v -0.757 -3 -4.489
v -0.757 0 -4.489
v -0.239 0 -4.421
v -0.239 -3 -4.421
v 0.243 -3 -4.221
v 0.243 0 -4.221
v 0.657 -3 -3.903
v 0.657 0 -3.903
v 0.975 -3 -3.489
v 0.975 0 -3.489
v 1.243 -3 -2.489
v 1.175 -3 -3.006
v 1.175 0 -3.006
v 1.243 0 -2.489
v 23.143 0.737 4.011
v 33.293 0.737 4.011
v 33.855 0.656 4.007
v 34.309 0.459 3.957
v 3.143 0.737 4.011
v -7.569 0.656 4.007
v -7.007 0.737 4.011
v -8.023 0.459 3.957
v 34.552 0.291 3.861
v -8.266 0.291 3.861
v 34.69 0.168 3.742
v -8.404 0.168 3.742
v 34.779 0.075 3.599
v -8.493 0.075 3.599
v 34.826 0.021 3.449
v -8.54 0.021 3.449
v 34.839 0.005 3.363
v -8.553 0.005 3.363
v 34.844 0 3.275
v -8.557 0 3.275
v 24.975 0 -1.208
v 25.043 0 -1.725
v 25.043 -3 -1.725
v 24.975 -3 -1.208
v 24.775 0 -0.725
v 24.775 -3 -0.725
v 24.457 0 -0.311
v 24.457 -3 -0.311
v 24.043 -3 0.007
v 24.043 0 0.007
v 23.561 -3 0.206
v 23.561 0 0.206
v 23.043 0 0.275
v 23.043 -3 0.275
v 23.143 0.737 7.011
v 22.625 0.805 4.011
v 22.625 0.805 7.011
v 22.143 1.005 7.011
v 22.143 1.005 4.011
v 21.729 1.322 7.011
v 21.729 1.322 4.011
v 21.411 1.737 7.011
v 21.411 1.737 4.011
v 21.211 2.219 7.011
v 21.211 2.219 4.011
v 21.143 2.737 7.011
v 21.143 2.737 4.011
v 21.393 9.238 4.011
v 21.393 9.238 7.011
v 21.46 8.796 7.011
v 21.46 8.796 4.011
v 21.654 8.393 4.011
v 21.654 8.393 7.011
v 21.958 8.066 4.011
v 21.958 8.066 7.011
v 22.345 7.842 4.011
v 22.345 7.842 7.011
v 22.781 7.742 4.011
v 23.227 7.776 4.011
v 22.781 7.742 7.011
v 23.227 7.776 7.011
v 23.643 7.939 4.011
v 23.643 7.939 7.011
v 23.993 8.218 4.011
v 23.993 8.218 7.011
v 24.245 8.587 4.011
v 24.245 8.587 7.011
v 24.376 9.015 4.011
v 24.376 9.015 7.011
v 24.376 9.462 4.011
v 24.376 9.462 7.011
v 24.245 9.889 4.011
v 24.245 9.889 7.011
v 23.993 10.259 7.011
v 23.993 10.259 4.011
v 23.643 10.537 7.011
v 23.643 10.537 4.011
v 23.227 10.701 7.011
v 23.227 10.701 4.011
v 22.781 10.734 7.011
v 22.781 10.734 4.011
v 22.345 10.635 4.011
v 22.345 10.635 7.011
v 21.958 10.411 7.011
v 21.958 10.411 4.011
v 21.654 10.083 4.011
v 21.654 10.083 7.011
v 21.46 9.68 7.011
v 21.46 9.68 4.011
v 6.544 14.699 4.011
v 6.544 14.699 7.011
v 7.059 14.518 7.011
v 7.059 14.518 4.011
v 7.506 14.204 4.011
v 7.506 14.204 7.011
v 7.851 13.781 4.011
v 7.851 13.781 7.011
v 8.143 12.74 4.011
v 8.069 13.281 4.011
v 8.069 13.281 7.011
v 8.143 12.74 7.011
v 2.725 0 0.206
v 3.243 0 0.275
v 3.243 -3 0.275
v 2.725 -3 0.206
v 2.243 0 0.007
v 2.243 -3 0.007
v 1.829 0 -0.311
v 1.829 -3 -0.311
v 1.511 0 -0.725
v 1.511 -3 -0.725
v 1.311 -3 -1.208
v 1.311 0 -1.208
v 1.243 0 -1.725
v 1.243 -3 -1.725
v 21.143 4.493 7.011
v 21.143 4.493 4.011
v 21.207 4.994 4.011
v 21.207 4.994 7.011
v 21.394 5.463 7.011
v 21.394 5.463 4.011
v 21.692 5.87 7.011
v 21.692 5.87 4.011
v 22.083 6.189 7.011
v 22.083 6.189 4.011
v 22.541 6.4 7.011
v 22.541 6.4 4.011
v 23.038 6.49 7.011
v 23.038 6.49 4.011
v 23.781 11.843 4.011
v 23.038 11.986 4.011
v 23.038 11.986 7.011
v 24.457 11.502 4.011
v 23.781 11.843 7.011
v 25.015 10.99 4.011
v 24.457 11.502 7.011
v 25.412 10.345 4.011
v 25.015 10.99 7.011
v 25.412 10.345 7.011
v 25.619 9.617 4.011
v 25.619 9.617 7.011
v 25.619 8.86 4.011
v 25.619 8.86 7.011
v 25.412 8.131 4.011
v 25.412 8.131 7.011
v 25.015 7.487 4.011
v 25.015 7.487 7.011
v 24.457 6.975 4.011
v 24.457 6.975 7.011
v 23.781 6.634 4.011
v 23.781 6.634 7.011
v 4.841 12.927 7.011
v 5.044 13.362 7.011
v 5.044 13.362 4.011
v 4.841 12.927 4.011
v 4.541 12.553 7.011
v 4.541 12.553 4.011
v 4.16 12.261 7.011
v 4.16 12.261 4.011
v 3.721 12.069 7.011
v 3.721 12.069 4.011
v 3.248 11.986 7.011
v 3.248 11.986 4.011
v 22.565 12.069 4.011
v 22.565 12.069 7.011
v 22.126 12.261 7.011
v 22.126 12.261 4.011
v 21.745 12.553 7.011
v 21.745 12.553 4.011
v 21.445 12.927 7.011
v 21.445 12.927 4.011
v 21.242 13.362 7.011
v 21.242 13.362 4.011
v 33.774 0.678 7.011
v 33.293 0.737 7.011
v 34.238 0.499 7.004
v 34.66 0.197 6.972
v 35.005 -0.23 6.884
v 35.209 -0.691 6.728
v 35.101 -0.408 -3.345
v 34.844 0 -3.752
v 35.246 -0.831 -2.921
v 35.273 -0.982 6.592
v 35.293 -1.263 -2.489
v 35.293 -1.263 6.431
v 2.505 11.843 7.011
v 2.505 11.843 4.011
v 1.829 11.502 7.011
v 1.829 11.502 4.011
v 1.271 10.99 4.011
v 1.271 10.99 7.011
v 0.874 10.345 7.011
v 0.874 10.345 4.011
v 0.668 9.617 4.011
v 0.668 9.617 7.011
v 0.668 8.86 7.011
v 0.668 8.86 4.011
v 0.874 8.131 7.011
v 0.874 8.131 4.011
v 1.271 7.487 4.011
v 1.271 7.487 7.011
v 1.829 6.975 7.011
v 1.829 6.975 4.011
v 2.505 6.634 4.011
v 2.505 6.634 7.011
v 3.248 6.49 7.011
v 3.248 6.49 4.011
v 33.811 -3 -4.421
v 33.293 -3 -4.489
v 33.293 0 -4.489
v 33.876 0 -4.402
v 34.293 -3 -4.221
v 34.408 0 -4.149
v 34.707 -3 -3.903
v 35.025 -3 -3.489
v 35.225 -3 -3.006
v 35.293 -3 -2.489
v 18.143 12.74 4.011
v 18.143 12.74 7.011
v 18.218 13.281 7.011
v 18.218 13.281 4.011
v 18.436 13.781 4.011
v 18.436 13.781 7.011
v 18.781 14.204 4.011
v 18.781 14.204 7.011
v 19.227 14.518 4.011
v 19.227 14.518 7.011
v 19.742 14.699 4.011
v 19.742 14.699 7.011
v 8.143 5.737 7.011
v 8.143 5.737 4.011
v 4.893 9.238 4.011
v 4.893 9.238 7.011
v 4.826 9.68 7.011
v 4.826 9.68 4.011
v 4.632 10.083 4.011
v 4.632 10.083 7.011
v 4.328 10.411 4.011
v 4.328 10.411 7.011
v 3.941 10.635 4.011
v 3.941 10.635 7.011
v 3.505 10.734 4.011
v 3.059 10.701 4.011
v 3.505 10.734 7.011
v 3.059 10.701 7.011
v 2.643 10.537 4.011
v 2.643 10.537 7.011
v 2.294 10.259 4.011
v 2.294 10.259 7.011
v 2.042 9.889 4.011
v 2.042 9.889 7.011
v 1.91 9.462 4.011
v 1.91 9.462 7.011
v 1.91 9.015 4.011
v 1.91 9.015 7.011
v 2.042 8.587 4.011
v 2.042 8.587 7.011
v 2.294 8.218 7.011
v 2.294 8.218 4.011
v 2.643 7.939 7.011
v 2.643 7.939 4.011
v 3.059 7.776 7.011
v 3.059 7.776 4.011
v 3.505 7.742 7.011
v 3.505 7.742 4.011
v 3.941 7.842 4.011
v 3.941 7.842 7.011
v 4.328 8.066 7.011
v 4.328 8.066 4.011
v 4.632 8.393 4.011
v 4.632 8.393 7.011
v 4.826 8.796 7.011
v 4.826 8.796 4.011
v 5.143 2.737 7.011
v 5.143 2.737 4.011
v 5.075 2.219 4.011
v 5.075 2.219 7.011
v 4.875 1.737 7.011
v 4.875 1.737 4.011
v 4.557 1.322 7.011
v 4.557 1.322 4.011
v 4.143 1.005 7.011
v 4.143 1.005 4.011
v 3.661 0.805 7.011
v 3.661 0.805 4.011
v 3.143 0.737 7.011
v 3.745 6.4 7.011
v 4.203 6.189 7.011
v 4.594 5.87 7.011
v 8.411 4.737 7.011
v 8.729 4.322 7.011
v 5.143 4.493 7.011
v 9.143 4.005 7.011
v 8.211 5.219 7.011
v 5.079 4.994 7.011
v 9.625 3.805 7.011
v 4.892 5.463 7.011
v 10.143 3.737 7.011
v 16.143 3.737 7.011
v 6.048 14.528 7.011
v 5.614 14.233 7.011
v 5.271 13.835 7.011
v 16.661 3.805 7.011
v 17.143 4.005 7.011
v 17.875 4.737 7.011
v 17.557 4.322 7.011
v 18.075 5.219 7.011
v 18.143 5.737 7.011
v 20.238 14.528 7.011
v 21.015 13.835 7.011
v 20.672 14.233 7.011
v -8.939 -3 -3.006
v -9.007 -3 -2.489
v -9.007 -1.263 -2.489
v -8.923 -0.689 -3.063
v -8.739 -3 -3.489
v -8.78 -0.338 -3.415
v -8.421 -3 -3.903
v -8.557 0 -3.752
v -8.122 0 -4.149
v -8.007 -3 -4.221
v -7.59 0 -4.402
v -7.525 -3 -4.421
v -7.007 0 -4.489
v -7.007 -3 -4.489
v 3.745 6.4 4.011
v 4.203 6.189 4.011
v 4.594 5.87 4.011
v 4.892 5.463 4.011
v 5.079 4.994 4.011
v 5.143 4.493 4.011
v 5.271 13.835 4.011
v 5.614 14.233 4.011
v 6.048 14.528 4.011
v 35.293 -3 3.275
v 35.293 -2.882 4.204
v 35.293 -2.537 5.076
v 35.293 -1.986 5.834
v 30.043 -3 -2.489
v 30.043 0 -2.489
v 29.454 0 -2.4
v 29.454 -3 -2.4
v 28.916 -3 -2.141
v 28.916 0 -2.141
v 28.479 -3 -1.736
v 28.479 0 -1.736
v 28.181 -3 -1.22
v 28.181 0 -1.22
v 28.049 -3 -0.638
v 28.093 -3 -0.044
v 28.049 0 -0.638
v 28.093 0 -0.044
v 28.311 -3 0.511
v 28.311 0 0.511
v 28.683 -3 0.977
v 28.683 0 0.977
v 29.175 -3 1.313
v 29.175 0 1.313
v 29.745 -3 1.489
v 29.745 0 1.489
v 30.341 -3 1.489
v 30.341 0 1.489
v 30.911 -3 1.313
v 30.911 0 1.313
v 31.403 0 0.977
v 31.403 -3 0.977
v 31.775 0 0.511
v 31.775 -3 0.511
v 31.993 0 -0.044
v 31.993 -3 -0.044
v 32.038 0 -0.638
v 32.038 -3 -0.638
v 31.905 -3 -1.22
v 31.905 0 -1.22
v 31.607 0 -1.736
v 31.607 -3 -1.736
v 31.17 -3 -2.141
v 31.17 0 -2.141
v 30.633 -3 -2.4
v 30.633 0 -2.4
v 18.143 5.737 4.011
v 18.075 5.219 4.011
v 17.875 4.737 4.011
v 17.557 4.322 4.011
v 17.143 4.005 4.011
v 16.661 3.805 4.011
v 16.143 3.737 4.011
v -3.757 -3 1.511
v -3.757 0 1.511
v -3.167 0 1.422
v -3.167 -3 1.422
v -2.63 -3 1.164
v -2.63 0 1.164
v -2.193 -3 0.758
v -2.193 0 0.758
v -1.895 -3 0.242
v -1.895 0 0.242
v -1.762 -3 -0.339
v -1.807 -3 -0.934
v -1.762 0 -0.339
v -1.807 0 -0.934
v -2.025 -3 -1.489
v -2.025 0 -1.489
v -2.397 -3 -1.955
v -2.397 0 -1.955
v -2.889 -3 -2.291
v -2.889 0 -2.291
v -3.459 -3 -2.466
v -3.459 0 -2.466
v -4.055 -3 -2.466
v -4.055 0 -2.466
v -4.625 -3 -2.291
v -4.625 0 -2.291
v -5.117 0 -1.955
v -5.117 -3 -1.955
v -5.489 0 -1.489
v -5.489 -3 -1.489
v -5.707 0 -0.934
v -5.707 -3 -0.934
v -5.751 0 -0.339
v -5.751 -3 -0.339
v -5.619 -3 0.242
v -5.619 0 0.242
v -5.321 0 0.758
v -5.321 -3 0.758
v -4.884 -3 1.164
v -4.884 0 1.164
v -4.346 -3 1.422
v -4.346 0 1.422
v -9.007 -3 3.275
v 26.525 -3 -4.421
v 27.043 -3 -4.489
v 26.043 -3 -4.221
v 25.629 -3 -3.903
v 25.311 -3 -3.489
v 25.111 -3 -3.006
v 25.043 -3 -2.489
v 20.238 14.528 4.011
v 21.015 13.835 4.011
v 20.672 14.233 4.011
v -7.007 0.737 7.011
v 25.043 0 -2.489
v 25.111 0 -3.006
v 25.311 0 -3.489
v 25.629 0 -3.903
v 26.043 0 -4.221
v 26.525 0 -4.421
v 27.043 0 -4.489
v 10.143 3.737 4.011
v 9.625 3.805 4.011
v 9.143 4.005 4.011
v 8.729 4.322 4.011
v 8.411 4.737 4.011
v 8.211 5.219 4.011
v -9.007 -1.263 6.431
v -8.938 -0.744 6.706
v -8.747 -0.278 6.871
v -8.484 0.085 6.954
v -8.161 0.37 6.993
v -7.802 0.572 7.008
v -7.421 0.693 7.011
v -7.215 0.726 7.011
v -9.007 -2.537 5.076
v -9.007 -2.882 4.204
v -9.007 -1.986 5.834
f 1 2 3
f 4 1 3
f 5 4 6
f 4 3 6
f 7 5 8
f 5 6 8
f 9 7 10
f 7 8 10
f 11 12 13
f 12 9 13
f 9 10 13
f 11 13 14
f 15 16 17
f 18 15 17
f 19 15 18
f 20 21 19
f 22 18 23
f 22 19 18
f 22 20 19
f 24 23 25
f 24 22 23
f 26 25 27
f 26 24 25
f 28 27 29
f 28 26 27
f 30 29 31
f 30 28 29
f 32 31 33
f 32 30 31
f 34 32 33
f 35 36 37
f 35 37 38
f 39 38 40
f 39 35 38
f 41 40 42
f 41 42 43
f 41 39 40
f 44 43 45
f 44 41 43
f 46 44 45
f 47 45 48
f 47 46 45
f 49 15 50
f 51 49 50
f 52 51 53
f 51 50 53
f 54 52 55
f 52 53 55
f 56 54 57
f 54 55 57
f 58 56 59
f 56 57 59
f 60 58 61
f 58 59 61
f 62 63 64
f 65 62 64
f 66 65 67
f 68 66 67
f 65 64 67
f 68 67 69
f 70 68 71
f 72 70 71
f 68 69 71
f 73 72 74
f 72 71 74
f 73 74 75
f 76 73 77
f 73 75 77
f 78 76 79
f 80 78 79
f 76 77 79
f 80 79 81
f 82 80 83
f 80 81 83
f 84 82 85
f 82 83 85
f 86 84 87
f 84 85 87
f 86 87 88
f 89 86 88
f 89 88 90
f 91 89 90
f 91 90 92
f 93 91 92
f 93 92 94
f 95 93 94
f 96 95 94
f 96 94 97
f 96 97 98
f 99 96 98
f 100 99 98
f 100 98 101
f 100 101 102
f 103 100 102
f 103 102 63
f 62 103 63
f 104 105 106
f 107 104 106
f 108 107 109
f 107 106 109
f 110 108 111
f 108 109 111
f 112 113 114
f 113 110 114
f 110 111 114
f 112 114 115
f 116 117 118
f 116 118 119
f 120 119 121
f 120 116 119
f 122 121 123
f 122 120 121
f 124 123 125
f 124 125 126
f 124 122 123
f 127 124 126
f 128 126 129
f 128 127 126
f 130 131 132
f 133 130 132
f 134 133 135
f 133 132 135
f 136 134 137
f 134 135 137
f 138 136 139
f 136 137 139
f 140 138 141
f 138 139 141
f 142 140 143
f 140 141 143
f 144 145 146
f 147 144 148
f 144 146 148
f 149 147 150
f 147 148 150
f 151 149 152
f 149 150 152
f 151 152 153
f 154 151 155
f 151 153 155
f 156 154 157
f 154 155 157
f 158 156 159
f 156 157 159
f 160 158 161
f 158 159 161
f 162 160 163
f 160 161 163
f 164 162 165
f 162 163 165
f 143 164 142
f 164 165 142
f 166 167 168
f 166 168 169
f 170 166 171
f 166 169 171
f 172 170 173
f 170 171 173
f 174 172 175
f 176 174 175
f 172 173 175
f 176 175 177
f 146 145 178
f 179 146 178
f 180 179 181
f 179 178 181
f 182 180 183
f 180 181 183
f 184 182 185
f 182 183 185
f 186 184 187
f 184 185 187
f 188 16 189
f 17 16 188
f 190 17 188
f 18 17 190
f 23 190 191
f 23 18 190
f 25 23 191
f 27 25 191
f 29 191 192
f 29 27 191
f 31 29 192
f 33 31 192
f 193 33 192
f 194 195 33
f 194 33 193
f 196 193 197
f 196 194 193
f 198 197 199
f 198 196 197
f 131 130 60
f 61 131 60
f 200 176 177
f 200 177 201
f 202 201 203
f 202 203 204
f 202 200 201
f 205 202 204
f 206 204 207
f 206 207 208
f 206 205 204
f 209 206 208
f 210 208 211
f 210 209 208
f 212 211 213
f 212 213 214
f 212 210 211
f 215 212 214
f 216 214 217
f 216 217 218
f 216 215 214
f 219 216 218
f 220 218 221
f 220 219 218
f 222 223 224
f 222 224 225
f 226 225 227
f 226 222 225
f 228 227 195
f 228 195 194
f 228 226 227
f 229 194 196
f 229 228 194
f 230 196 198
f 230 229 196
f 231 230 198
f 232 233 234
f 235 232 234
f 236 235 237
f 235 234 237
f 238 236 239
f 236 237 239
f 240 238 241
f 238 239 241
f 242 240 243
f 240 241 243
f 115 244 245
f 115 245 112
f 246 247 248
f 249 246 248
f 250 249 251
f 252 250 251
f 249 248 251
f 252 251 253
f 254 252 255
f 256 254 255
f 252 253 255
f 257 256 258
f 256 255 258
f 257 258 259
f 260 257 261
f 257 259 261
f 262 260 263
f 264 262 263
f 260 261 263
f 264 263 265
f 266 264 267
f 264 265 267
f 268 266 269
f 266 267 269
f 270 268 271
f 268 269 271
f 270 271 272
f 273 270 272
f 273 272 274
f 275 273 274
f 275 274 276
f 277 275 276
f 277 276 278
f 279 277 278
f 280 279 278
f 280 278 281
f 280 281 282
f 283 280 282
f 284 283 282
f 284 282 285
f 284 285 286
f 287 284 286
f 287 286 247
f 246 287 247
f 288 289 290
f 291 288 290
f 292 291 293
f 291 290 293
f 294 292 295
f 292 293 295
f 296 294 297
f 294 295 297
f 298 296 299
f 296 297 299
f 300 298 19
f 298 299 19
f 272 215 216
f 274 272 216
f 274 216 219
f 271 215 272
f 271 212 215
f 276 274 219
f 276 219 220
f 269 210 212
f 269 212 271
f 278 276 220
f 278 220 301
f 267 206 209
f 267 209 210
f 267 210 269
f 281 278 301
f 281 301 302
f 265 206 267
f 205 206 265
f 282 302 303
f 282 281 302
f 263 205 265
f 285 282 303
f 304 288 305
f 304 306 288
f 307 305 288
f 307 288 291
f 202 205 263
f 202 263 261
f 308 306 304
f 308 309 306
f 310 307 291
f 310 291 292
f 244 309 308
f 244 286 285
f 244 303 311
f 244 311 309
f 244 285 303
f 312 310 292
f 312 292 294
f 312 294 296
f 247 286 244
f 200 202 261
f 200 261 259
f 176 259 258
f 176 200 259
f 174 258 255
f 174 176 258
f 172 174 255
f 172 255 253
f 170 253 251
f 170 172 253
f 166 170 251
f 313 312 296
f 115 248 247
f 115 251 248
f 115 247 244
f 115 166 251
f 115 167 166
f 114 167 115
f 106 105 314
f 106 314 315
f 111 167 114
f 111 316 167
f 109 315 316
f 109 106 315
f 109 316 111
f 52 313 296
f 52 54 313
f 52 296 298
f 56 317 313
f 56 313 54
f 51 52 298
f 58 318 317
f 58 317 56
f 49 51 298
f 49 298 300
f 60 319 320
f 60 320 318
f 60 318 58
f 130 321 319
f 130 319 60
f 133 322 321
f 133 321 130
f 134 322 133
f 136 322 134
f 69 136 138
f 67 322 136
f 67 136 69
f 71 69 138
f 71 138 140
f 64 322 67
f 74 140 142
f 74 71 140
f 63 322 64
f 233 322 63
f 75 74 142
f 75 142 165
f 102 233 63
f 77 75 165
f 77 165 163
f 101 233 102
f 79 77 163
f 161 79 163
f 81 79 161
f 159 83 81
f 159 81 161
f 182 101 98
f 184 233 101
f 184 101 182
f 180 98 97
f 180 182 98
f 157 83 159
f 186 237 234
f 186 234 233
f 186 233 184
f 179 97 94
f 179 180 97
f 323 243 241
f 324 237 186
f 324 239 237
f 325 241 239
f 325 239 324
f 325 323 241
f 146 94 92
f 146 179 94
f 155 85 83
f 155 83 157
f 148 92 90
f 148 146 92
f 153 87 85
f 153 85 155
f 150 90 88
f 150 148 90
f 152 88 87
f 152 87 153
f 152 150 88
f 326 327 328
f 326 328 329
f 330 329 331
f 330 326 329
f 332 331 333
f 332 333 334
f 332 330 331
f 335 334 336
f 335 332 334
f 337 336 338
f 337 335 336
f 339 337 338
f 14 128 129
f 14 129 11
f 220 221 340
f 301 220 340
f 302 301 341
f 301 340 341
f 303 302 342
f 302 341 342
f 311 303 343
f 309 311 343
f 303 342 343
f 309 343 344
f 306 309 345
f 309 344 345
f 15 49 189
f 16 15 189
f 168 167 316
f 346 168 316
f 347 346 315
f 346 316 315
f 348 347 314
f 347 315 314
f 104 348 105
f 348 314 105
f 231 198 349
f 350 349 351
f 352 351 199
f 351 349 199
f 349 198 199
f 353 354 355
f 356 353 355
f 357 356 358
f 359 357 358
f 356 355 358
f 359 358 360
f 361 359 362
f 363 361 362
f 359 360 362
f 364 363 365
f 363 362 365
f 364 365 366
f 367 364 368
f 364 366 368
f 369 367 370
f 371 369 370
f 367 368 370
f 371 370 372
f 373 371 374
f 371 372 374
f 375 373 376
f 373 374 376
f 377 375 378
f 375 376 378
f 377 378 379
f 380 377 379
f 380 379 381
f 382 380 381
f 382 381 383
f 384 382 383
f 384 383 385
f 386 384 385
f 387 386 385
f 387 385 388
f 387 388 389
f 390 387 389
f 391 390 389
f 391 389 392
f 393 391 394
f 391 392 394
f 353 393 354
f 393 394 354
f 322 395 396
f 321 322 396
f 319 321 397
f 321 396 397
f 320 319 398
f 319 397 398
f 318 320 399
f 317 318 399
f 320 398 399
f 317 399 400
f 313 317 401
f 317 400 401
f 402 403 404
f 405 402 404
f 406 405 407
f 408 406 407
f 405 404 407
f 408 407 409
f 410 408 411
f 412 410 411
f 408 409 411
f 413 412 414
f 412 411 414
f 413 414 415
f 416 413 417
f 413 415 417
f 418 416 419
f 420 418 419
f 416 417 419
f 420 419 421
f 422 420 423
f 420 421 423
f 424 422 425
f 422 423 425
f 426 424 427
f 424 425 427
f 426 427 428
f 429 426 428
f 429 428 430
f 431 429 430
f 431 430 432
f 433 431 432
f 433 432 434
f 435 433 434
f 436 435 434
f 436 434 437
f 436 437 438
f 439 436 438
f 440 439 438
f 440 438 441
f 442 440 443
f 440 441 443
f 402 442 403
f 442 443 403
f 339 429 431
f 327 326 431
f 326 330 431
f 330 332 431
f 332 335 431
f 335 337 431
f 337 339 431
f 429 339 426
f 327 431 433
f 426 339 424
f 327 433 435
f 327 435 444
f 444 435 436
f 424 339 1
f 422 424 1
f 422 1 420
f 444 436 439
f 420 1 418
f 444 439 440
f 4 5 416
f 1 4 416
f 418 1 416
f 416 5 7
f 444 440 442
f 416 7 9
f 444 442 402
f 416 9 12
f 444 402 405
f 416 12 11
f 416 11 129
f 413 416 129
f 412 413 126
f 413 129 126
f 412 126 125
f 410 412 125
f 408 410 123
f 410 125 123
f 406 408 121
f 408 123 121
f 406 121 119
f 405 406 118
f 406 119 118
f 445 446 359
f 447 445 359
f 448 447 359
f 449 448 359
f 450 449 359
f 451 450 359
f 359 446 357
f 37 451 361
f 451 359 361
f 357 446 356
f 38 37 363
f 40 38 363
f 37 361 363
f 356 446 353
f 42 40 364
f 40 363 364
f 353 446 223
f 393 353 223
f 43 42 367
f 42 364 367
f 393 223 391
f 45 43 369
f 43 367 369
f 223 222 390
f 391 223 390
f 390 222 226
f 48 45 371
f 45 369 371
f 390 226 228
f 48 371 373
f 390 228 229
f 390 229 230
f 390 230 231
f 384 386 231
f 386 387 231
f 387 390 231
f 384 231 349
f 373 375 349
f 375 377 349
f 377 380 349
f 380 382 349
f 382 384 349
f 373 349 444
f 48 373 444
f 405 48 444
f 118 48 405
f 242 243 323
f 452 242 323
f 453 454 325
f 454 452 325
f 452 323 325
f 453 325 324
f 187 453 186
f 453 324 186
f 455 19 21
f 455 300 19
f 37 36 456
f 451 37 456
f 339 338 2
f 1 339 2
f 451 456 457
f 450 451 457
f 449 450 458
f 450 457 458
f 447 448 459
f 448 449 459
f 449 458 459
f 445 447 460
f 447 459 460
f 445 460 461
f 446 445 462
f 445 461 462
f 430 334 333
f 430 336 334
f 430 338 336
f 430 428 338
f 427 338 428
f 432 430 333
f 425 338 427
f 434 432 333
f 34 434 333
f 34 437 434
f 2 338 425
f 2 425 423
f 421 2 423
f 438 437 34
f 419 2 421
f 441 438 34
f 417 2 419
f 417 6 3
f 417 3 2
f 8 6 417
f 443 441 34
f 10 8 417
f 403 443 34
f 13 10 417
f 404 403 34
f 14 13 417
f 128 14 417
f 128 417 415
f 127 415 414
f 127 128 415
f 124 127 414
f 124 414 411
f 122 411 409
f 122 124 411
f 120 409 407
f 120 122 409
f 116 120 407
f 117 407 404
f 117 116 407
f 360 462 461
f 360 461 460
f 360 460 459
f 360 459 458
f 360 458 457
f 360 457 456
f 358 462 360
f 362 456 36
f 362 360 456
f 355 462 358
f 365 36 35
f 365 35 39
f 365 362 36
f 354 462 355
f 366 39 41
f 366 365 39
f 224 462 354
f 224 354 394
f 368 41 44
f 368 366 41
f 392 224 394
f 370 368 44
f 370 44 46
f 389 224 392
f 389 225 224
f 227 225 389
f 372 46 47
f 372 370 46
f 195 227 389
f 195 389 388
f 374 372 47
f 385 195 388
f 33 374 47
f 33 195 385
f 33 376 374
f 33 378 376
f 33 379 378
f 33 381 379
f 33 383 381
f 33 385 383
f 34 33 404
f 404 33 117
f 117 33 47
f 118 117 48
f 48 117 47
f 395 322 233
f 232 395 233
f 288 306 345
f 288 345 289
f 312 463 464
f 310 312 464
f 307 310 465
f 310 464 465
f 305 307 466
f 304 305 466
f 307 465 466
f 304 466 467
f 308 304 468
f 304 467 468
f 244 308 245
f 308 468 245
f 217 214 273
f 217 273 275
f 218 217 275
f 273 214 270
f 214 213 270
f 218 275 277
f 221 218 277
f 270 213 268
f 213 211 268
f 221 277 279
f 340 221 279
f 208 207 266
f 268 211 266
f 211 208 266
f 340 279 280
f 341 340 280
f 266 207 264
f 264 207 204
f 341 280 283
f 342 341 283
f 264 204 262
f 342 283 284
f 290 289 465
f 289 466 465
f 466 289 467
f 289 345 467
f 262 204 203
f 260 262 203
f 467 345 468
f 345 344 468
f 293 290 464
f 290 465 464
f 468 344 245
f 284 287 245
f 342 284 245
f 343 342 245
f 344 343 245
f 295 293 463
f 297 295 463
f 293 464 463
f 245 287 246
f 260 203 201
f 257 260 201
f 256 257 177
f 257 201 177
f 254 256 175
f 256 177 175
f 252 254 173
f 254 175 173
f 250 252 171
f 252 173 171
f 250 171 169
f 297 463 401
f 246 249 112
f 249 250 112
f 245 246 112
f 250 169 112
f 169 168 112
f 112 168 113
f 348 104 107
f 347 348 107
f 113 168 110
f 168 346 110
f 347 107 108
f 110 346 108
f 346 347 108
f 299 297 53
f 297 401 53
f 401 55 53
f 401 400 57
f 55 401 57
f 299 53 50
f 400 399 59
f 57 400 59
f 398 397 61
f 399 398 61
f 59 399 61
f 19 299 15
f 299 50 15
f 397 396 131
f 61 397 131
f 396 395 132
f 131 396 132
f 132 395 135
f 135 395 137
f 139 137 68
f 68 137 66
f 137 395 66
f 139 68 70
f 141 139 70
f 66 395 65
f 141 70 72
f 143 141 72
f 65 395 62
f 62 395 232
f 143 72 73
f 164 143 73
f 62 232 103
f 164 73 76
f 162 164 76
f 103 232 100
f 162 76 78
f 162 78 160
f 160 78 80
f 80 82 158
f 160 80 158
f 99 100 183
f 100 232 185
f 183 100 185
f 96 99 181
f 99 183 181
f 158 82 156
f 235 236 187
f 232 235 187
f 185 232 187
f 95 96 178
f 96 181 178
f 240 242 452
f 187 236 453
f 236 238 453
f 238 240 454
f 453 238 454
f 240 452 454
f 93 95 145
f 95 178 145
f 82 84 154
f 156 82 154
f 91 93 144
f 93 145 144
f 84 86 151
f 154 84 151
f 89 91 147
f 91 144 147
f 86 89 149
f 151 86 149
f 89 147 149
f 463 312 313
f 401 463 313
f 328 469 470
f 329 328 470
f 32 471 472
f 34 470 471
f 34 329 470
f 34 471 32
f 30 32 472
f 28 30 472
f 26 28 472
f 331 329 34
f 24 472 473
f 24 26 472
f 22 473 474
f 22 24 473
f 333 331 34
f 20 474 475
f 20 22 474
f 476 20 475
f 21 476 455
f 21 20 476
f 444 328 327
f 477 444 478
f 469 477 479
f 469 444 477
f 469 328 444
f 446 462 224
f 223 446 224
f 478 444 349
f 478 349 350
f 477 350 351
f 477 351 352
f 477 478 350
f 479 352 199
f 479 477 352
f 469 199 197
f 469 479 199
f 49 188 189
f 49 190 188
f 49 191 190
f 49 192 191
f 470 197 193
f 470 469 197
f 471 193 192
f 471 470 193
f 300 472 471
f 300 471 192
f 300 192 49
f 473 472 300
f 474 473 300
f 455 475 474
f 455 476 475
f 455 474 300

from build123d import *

# Parameters (mm, degrees)
ESBO_O23_W                     = 44.3
ESBO_O23_H                     = 11.5
ESBO_O23_R                     = 2
FLANGE_BASE2_DEPTH             = 3
ARESTA_FLANGE1_STRIP_W         = 13.4732
ARESTA_FLANGE1_STRIP_H         = 3
ARESTA_FLANGE1_STRIP_CUT_DEPTH = 44.3
ARESTA_FLANGE1_DEPTH           = 44.3
CORTE_EXTRUS_O1_REACH          = 41.939
CORTE_EXTRUS_O2_REACH          = 41.939
ESBO_O33_R                     = 1.5
ESBO_O33_W                     = 10
ESBO_O33_H                     = 11.0034
FILETE1_START                  = -5
FILETE1_DEPTH                  = 12.011168151
FILETE1_START_2                = 4.011168151
FILETE1_2_DEPTH                = 3
FILETE1_3_DEPTH                = 3
FILETE1_START_3                = -4
FILETE1_4_DEPTH                = 4.7366001
ESBO_O34_W                     = 23.8
ESBO_O34_H                     = 4.7634
CORTE_EXTRUS_O3_DEPTH          = 39.884804768
FILETE2_R                      = 2


with BuildPart() as part:
    # Flange-base2: sheet metal written as solids
    # Esboço23 → Flange-base2 (new body)
    with BuildSketch(Plane(origin=(0, 0, 0), x_dir=(1, 0, 0), z_dir=(0, 1, 0))):
        with Locations((13.143114832, -1.261168151)):
            Rectangle(ESBO_O23_W, ESBO_O23_H)
        with Locations(Location((-3.756885168, 0.488831849, 0), (0, 0, 270))):
            Circle(ESBO_O23_R, mode=Mode.SUBTRACT)
        with Locations(Location((30.043114832, 0.488831849, 0), (0, 0, 90))):
            Circle(ESBO_O23_R, mode=Mode.SUBTRACT)
    extrude(amount=-FLANGE_BASE2_DEPTH)

    # Aresta-Flange1: sheet metal written as solids
    # Aresta-Flange1 strip (on a plane across the edge) → Aresta-Flange1 strip cut (cut)
    with BuildSketch(Plane(origin=(-9.006885168, 0, 7.011168151), x_dir=(0, 0, -1), z_dir=(1, 0, 0))):
        with Locations((-3, -1.5)):
            Rectangle(ARESTA_FLANGE1_STRIP_W, ARESTA_FLANGE1_STRIP_H)
    extrude(amount=ARESTA_FLANGE1_STRIP_CUT_DEPTH, mode=Mode.SUBTRACT)

    # Aresta-Flange1 section (on a plane across the edge) → Aresta-Flange1 (add)
    with BuildSketch(Plane(origin=(-9.006885168, 0, 7.011168151), x_dir=(0, 0, -1), z_dir=(1, 0, 0))):
        with BuildLine():
            Line((0, 0.7366), (0, 14.74))
            Line((0, 14.74), (3, 14.74))
            Line((3, 14.74), (3, 0.7366))
            ThreePointArc((3, 0.7366), (3.215745145, 0.215745145), (3.7366, 0))
            Line((3.7366, 0), (3.7366, -3))
            ThreePointArc((3.7366, -3), (1.094424801, -1.905575199), (0, 0.7366))
        make_face()
    extrude(amount=ARESTA_FLANGE1_DEPTH)

    # Esboço31 → Corte-extrusão1 (cut, up to next)
    with BuildSketch(Plane.XY.offset(7.011168151), mode=Mode.PRIVATE) as corte_extrus_o1_sk1:
        with BuildLine():
            Line((5.143114832, 14.74), (5.143114832, 11.99))
            Line((5.143114832, 11.99), (3.393114832, 11.99))
            ThreePointArc((3.393114832, 11.99), (0.641414832, 9.2383), (3.393114832, 6.4866))
            Line((3.393114832, 6.4866), (5.143114832, 6.4866))
            Line((5.143114832, 6.4866), (5.143114832, 0.7366))
            Line((5.143114832, 0.7366), (-9.006885168, 0.7366))
            Line((-9.006885168, 0.7366), (-9.006885168, 14.74))
            Line((-9.006885168, 14.74), (5.143114832, 14.74))
        make_face()
    corte_extrus_o1_tool1 = extrude(corte_extrus_o1_sk1.sketch, amount=-CORTE_EXTRUS_O1_REACH, mode=Mode.PRIVATE) & part.part
    # Esboço31 → Corte-extrusão1 (cut, up to next)
    with BuildSketch(Plane.XY.offset(7.011168151), mode=Mode.PRIVATE) as corte_extrus_o1_sk2:
        with BuildLine():
            Line((21.143114832, 6.4866), (21.143114832, 0.7366))
            Line((21.143114832, 0.7366), (35.293114832, 0.7366))
            Line((35.293114832, 0.7366), (35.293114832, 14.74))
            Line((35.293114832, 14.74), (21.143114832, 14.74))
            Line((21.143114832, 14.74), (21.143114832, 11.99))
            Line((21.143114832, 11.99), (22.893114832, 11.99))
            ThreePointArc((22.893114832, 11.99), (25.644814832, 9.2383), (22.893114832, 6.4866))
            Line((22.893114832, 6.4866), (21.143114832, 6.4866))
        make_face()
    corte_extrus_o1_tool2 = extrude(corte_extrus_o1_sk2.sketch, amount=-CORTE_EXTRUS_O1_REACH, mode=Mode.PRIVATE) & part.part
    add(corte_extrus_o1_tool1.solids().sort_by_distance((-2.549902, 7.555498, 7.011168))[0], mode=Mode.SUBTRACT)
    add(corte_extrus_o1_tool2.solids().sort_by_distance((28.836132, 7.555498, 7.011168))[0], mode=Mode.SUBTRACT)

    # Esboço33 → Corte-extrusão2 (cut, up to next)
    with BuildSketch(Plane.XY.offset(7.011168151), mode=Mode.PRIVATE) as corte_extrus_o2_sk1:
        with Locations((3.393114832, 9.2383)):
            Circle(ESBO_O33_R)
    corte_extrus_o2_tool1 = extrude(corte_extrus_o2_sk1.sketch, amount=-CORTE_EXTRUS_O2_REACH, mode=Mode.PRIVATE) & part.part
    # Esboço33 → Corte-extrusão2 (cut, up to next)
    with BuildSketch(Plane.XY.offset(7.011168151), mode=Mode.PRIVATE) as corte_extrus_o2_sk2:
        with Locations(Location((22.893114832, 9.2383, 0), (0, 0, 180))):
            Circle(ESBO_O33_R)
    corte_extrus_o2_tool2 = extrude(corte_extrus_o2_sk2.sketch, amount=-CORTE_EXTRUS_O2_REACH, mode=Mode.PRIVATE) & part.part
    # Esboço33 → Corte-extrusão2 (cut, up to next)
    with BuildSketch(Plane.XY.offset(7.011168151), mode=Mode.PRIVATE) as corte_extrus_o2_sk3:
        with Locations((13.143114832, 9.2383)):
            Rectangle(ESBO_O33_W, ESBO_O33_H)
    corte_extrus_o2_tool3 = extrude(corte_extrus_o2_sk3.sketch, amount=-CORTE_EXTRUS_O2_REACH, mode=Mode.PRIVATE) & part.part
    add(corte_extrus_o2_tool1.solids().sort_by_distance((3.393115, 9.2383, 7.011168))[0], mode=Mode.SUBTRACT)
    add(corte_extrus_o2_tool2.solids().sort_by_distance((22.893115, 9.2383, 7.011168))[0], mode=Mode.SUBTRACT)
    add(corte_extrus_o2_tool3.solids().sort_by_distance((13.143115, 9.2383, 7.011168))[0], mode=Mode.SUBTRACT)

    # Filete1: read off the stored shape, not the designer's step
    # Filete1 outline → Filete1 (cut)
    with BuildSketch(Plane.XY.offset(FILETE1_START)):
        with BuildLine():
            Line((-9.006885168, 0.7366), (-9.006885168, -1.2634))
            ThreePointArc((-9.006885168, -1.2634), (-8.42109873, 0.150813562), (-7.006885168, 0.7366))
            Line((-7.006885168, 0.7366), (-9.006885168, 0.7366))
        make_face()
        with BuildLine():
            ThreePointArc((33.293114832, 0.7366), (34.707328395, 0.150813562), (35.293114832, -1.2634))
            Line((35.293114832, -1.2634), (35.293114832, 0.7366))
            Line((35.293114832, 0.7366), (33.293114832, 0.7366))
        make_face()
    extrude(amount=FILETE1_DEPTH, mode=Mode.SUBTRACT)

    # Filete1 2 outline → Filete1 2 (add)
    with BuildSketch(Plane.XY.offset(FILETE1_START_2)):
        with BuildLine():
            ThreePointArc((5.143114832, 2.7366), (4.557328394, 1.322386438), (3.143114832, 0.7366))
            Line((3.143114832, 0.7366), (5.143114832, 0.7366))
            Line((5.143114832, 0.7366), (5.143114832, 2.7366))
        make_face()
        with BuildLine():
            Line((21.143114832, 0.7366), (23.143114832, 0.7366))
            ThreePointArc((23.143114832, 0.7366), (21.72890127, 1.322386438), (21.143114832, 2.7366))
            Line((21.143114832, 2.7366), (21.143114832, 0.7366))
        make_face()
        with BuildLine():
            Line((8.143114832, 3.7366), (10.143114832, 3.7366))
            ThreePointArc((10.143114832, 3.7366), (8.72890127, 4.322386438), (8.143114832, 5.7366))
            Line((8.143114832, 5.7366), (8.143114832, 3.7366))
        make_face()
        with BuildLine():
            ThreePointArc((18.143114832, 5.7366), (17.557328394, 4.322386437), (16.143114832, 3.7366))
            Line((16.143114832, 3.7366), (18.143114832, 3.7366))
            Line((18.143114832, 3.7366), (18.143114832, 5.7366))
        make_face()
    extrude(amount=FILETE1_2_DEPTH)

    # Filete1 3 outline → Filete1 3 (add)
    with BuildSketch(Plane.XY.offset(FILETE1_START_2)):
        with BuildLine():
            ThreePointArc((22.893114832, 11.99), (22.96552716, 11.989047052), (23.037889334, 11.986188868))
            ThreePointArc((23.037889334, 11.986188868), (21.69217531, 12.606910766), (21.143114832, 13.983418849))
            Line((21.143114832, 13.983418849), (21.143114832, 11.99))
            Line((21.143114832, 11.99), (22.893114832, 11.99))
        make_face()
        with BuildLine():
            ThreePointArc((21.143114832, 4.493181151), (21.69217531, 5.869689234), (23.037889334, 6.490411131))
            ThreePointArc((23.037889334, 6.490411131), (22.96552716, 6.487552948), (22.893114832, 6.4866))
            Line((22.893114832, 6.4866), (21.143114832, 6.4866))
            Line((21.143114832, 6.4866), (21.143114832, 4.493181151))
        make_face()
        with BuildLine():
            ThreePointArc((5.143114832, 13.983418849), (4.594054355, 12.606910766), (3.248340331, 11.986188869))
            ThreePointArc((3.248340331, 11.986188869), (3.320702504, 11.989047052), (3.393114832, 11.99))
            Line((3.393114832, 11.99), (5.143114832, 11.99))
            Line((5.143114832, 11.99), (5.143114832, 13.983418849))
        make_face()
        with BuildLine():
            ThreePointArc((3.248340331, 6.490411131), (4.594054355, 5.869689234), (5.143114832, 4.493181151))
            Line((5.143114832, 4.493181151), (5.143114832, 6.4866))
            Line((5.143114832, 6.4866), (3.393114832, 6.4866))
            ThreePointArc((3.393114832, 6.4866), (3.320702504, 6.487552948), (3.248340331, 6.490411131))
        make_face()
    extrude(amount=FILETE1_3_DEPTH)

    # Filete1 4 outline → Filete1 4 (cut)
    with BuildSketch(Plane(origin=(0, 0, 0), x_dir=(1, 0, 0), z_dir=(0, 1, 0)).offset(FILETE1_START_3)):
        with BuildLine():
            Line((35.293114832, 4.488831849), (33.293114832, 4.488831849))
            ThreePointArc((33.293114832, 4.488831849), (34.707328395, 3.903045412), (35.293114832, 2.488831849))
            Line((35.293114832, 2.488831849), (35.293114832, 4.488831849))
        make_face()
        with BuildLine():
            ThreePointArc((-9.006885168, 2.488831849), (-8.421098731, 3.903045412), (-7.006885168, 4.488831849))
            Line((-7.006885168, 4.488831849), (-9.006885168, 4.488831849))
            Line((-9.006885168, 4.488831849), (-9.006885168, 2.488831849))
        make_face()
    extrude(amount=FILETE1_4_DEPTH, mode=Mode.SUBTRACT)

    # Esboço34 → Corte-extrusão3 (cut, through all)
    with BuildSketch(Plane(origin=(0, 0, 0), x_dir=(1, 0, 0), z_dir=(0, 1, 0))):
        with Locations((13.143114832, 2.107131849)):
            Rectangle(ESBO_O34_W, ESBO_O34_H)
    extrude(amount=-CORTE_EXTRUS_O3_DEPTH, mode=Mode.SUBTRACT)

    # Filete2
    # the kernel refuses this fillet: 2 mm, written as the material it adds along each edge
    with BuildSketch(Plane(origin=(1.243114832, 0, 0.274568151), x_dir=(0, 0, -1), z_dir=(0, -1, 0))) as filete2_piece_1:
        with BuildLine():
            CenterArc((FILETE2_R, FILETE2_R), FILETE2_R, 180, 90)
            Line((0, FILETE2_R), (0, 0))
            Line((0, 0), (FILETE2_R, 0))
        make_face()
    extrude(amount=3)
    with BuildSketch(Plane(origin=(25.043114832, 0, 0.274568151), x_dir=(0, 0, -1), z_dir=(0, -1, 0))) as filete2_piece_2:
        with BuildLine():
            CenterArc((FILETE2_R, -FILETE2_R), FILETE2_R, 90, 90)
            Line((0, -FILETE2_R), (0, 0))
            Line((0, 0), (FILETE2_R, 0))
        make_face()
    extrude(amount=3)
    # the kernel refuses this fillet: 2 mm, written as the material it takes off along each edge
    with BuildSketch(Plane(origin=(5.143114832, 14.74, 11.515742565), x_dir=(1, 0, 0), z_dir=(0, 0, -1))) as filete2_2_piece_1:
        with BuildLine():
            CenterArc((1.801829766, 2), FILETE2_R, 198.110746947, 71.889253053)
            Line((-0.099085117, 1.378290576), (-0.289176606, 1.316119634))
            ThreePointArc((-0.289176606, 1.316119634), (-0.2, 0.756581151), (-0.2, 0))
            Line((-0.2, 0), (0, -0.2))
            Line((0, -0.2), (1.801829766, -0.2))
            Line((1.801829766, -0.2), (1.801829766, 0))
        make_face()
    extrude(amount=12.009148828, mode=Mode.SUBTRACT)
    with BuildSketch(Plane(origin=(21.143114832, 14.74, 11.515742565), x_dir=(0.07170480855584176, -0.9974258972124044, 0), z_dir=(0, 0, -1))) as filete2_2_piece_2:
        with BuildLine():
            CenterArc((1.865651936, 1.940601288), FILETE2_R, 184.111911668, 71.889253032)
            Line((-0.129199858, 1.797191671), (-0.328685038, 1.782850709))
            Line((-0.328685038, 1.782850709), (-0.199485179, -0.014340962))
            Line((-0.199485179, -0.014340962), (0.014340962, -0.199485179))
            ThreePointArc((0.014340962, -0.199485179), (0.768974595, -0.145234673), (1.333467159, -0.194060129))
            Line((1.333467159, -0.194060129), (1.381847593, 0))
        make_face()
    extrude(amount=12.009148828, mode=Mode.SUBTRACT)
    with BuildSketch(Plane(origin=(8.143114832, 14.74, 12.011168151), x_dir=(0, -1, 0), z_dir=(0, 0, -1)), Plane(origin=(18.143114832, 14.74, 12.011168151), x_dir=(1, 0, 0), z_dir=(0, 0, -1)), Plane(origin=(25.043114832, 5, -4.488831849), x_dir=(1, 0, 0), z_dir=(0, -1, 0))) as filete2_2_piece_3:
        with BuildLine():
            CenterArc((FILETE2_R, FILETE2_R), FILETE2_R, 180, 90)
            Line((0, FILETE2_R), (0, 0))
            Line((0, 0), (FILETE2_R, 0))
        make_face()
    extrude(amount=13, mode=Mode.SUBTRACT)
    with BuildSketch(Plane(origin=(1.243114832, 5, -4.488831849), x_dir=(-1, 0, 0), z_dir=(0, -1, 0))) as filete2_2_piece_4:
        with BuildLine():
            CenterArc((FILETE2_R, -FILETE2_R), FILETE2_R, 90, 90)
            Line((0, -FILETE2_R), (0, 0))
            Line((0, 0), (FILETE2_R, 0))
        make_face()
    extrude(amount=13, mode=Mode.SUBTRACT)


solid = part.part
